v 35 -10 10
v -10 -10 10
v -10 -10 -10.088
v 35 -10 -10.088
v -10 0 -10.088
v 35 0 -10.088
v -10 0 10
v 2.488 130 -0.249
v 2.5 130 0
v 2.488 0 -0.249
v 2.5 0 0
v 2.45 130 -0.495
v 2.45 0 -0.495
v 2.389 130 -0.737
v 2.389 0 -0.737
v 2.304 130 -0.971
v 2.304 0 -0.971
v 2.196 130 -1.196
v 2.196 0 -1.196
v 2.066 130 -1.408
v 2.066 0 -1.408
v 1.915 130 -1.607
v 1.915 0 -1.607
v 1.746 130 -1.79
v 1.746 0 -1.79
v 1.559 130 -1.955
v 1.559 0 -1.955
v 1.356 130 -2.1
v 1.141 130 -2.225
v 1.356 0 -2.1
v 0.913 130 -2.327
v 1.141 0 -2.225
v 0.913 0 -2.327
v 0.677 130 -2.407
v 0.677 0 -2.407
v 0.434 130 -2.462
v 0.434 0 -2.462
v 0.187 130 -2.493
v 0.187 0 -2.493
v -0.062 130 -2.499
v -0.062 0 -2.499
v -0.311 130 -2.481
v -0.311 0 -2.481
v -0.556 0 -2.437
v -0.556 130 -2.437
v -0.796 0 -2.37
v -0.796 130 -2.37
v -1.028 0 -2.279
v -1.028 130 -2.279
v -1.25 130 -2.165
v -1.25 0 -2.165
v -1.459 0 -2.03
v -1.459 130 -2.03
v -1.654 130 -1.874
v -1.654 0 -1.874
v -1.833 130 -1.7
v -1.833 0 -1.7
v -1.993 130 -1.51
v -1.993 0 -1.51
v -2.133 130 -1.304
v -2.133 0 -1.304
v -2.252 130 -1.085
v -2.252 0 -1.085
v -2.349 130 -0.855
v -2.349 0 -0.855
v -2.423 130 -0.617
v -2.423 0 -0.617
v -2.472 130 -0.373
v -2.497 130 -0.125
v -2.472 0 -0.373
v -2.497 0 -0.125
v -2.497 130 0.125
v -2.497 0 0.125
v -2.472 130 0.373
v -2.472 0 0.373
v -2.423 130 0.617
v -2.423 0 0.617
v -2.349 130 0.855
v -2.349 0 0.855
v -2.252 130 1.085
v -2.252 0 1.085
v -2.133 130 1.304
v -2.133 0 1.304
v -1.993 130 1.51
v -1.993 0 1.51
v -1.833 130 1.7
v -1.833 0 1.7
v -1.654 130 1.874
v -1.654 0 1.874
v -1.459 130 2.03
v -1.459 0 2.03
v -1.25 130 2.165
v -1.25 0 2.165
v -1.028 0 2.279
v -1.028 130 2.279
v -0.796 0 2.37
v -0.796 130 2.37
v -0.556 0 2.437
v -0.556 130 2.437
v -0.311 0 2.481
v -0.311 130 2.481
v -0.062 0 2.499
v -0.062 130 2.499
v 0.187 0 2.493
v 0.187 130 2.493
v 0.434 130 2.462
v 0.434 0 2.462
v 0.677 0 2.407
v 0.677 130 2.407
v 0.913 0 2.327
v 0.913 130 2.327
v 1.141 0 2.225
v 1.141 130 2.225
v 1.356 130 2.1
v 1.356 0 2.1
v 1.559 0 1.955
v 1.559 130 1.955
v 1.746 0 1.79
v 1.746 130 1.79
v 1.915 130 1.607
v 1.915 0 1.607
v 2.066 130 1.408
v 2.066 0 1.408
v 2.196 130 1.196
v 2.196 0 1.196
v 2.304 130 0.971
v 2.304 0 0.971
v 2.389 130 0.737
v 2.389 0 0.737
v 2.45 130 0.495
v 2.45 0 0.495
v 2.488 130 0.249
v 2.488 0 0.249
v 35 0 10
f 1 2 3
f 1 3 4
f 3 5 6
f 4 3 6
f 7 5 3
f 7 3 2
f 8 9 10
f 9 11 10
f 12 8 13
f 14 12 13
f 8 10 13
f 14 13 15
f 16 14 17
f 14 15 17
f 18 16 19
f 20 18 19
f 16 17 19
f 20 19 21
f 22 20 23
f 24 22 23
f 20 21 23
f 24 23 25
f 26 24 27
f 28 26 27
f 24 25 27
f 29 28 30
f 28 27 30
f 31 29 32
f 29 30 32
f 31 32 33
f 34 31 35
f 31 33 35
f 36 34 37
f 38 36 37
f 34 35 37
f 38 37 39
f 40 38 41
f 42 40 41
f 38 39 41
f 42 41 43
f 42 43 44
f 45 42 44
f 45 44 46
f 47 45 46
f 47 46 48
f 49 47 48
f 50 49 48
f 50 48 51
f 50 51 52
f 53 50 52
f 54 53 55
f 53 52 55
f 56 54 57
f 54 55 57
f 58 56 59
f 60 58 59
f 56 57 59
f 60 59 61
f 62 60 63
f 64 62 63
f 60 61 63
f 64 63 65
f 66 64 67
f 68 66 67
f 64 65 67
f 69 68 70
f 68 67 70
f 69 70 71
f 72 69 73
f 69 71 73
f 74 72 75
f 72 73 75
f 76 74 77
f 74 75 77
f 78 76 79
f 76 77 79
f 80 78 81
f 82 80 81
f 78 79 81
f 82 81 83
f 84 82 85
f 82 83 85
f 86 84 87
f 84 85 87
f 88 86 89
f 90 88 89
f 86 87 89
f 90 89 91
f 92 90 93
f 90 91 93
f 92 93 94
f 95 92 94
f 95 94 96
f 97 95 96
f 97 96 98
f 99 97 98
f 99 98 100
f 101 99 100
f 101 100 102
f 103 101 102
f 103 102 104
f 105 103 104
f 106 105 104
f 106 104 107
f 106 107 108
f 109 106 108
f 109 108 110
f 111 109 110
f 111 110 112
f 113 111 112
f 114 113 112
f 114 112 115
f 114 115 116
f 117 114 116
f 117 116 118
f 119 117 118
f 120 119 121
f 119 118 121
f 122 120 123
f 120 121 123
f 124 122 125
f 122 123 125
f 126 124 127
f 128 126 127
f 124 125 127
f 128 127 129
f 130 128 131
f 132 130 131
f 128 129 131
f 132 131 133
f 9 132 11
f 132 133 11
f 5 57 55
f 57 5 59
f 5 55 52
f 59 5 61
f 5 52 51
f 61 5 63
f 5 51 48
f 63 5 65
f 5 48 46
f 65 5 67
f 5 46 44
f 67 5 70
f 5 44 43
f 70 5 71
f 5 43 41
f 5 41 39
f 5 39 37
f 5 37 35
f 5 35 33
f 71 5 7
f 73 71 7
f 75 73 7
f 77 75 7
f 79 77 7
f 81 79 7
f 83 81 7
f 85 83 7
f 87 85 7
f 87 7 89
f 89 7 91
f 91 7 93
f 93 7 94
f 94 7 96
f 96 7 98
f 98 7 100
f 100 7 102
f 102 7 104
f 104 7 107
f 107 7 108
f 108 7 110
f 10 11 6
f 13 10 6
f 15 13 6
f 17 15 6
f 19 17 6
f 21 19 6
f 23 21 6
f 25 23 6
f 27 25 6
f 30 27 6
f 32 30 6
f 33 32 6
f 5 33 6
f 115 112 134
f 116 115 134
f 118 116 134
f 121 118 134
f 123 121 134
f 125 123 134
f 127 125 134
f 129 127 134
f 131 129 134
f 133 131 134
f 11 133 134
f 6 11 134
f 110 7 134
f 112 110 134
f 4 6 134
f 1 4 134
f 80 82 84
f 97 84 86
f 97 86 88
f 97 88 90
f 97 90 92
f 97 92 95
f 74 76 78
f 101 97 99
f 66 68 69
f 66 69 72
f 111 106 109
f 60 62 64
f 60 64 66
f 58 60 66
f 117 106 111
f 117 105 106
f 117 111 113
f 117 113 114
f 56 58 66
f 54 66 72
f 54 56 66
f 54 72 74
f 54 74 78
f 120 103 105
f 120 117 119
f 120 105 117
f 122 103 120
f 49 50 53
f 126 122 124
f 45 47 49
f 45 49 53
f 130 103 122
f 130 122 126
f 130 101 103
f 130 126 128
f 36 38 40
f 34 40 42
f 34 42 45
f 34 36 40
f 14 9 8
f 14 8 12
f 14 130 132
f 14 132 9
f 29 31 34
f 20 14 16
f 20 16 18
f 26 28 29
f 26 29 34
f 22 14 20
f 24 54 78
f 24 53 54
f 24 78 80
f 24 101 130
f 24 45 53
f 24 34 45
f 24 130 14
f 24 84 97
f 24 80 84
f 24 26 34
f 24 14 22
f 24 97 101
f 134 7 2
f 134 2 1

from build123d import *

# Parameters (mm, degrees)
CROQUIS1_R              = 2.5
SALIENTE_EXTRUIR1_DEPTH = 20
CROQUIS2_W              = 45
CROQUIS2_H              = 20.08756727
SALIENTE_EXTRUIR2_DEPTH = 10
CROQUIS3_R              = 2.5
SALIENTE_EXTRUIR3_DEPTH = 110


with BuildPart() as part:
    # Croquis1 → Saliente-Extruir1 (new body)
    with BuildSketch(Plane(origin=(0, 0, 0), x_dir=(1, 0, 0), z_dir=(0, 1, 0))):
        Circle(CROQUIS1_R)
    extrude(amount=SALIENTE_EXTRUIR1_DEPTH)

    # Croquis2 → Saliente-Extruir2 (add)
    with BuildSketch(Plane.XZ):
        with Locations((12.5, -0.043783635)):
            Rectangle(CROQUIS2_W, CROQUIS2_H)
    extrude(amount=SALIENTE_EXTRUIR2_DEPTH)

    # Croquis3 → Saliente-Extruir3 (add)
    with BuildSketch(Plane(origin=(0, 20, 0), x_dir=(1, 0, 0), z_dir=(0, 1, 0))):
        Circle(CROQUIS3_R)
    extrude(amount=SALIENTE_EXTRUIR3_DEPTH)


solid = part.part
